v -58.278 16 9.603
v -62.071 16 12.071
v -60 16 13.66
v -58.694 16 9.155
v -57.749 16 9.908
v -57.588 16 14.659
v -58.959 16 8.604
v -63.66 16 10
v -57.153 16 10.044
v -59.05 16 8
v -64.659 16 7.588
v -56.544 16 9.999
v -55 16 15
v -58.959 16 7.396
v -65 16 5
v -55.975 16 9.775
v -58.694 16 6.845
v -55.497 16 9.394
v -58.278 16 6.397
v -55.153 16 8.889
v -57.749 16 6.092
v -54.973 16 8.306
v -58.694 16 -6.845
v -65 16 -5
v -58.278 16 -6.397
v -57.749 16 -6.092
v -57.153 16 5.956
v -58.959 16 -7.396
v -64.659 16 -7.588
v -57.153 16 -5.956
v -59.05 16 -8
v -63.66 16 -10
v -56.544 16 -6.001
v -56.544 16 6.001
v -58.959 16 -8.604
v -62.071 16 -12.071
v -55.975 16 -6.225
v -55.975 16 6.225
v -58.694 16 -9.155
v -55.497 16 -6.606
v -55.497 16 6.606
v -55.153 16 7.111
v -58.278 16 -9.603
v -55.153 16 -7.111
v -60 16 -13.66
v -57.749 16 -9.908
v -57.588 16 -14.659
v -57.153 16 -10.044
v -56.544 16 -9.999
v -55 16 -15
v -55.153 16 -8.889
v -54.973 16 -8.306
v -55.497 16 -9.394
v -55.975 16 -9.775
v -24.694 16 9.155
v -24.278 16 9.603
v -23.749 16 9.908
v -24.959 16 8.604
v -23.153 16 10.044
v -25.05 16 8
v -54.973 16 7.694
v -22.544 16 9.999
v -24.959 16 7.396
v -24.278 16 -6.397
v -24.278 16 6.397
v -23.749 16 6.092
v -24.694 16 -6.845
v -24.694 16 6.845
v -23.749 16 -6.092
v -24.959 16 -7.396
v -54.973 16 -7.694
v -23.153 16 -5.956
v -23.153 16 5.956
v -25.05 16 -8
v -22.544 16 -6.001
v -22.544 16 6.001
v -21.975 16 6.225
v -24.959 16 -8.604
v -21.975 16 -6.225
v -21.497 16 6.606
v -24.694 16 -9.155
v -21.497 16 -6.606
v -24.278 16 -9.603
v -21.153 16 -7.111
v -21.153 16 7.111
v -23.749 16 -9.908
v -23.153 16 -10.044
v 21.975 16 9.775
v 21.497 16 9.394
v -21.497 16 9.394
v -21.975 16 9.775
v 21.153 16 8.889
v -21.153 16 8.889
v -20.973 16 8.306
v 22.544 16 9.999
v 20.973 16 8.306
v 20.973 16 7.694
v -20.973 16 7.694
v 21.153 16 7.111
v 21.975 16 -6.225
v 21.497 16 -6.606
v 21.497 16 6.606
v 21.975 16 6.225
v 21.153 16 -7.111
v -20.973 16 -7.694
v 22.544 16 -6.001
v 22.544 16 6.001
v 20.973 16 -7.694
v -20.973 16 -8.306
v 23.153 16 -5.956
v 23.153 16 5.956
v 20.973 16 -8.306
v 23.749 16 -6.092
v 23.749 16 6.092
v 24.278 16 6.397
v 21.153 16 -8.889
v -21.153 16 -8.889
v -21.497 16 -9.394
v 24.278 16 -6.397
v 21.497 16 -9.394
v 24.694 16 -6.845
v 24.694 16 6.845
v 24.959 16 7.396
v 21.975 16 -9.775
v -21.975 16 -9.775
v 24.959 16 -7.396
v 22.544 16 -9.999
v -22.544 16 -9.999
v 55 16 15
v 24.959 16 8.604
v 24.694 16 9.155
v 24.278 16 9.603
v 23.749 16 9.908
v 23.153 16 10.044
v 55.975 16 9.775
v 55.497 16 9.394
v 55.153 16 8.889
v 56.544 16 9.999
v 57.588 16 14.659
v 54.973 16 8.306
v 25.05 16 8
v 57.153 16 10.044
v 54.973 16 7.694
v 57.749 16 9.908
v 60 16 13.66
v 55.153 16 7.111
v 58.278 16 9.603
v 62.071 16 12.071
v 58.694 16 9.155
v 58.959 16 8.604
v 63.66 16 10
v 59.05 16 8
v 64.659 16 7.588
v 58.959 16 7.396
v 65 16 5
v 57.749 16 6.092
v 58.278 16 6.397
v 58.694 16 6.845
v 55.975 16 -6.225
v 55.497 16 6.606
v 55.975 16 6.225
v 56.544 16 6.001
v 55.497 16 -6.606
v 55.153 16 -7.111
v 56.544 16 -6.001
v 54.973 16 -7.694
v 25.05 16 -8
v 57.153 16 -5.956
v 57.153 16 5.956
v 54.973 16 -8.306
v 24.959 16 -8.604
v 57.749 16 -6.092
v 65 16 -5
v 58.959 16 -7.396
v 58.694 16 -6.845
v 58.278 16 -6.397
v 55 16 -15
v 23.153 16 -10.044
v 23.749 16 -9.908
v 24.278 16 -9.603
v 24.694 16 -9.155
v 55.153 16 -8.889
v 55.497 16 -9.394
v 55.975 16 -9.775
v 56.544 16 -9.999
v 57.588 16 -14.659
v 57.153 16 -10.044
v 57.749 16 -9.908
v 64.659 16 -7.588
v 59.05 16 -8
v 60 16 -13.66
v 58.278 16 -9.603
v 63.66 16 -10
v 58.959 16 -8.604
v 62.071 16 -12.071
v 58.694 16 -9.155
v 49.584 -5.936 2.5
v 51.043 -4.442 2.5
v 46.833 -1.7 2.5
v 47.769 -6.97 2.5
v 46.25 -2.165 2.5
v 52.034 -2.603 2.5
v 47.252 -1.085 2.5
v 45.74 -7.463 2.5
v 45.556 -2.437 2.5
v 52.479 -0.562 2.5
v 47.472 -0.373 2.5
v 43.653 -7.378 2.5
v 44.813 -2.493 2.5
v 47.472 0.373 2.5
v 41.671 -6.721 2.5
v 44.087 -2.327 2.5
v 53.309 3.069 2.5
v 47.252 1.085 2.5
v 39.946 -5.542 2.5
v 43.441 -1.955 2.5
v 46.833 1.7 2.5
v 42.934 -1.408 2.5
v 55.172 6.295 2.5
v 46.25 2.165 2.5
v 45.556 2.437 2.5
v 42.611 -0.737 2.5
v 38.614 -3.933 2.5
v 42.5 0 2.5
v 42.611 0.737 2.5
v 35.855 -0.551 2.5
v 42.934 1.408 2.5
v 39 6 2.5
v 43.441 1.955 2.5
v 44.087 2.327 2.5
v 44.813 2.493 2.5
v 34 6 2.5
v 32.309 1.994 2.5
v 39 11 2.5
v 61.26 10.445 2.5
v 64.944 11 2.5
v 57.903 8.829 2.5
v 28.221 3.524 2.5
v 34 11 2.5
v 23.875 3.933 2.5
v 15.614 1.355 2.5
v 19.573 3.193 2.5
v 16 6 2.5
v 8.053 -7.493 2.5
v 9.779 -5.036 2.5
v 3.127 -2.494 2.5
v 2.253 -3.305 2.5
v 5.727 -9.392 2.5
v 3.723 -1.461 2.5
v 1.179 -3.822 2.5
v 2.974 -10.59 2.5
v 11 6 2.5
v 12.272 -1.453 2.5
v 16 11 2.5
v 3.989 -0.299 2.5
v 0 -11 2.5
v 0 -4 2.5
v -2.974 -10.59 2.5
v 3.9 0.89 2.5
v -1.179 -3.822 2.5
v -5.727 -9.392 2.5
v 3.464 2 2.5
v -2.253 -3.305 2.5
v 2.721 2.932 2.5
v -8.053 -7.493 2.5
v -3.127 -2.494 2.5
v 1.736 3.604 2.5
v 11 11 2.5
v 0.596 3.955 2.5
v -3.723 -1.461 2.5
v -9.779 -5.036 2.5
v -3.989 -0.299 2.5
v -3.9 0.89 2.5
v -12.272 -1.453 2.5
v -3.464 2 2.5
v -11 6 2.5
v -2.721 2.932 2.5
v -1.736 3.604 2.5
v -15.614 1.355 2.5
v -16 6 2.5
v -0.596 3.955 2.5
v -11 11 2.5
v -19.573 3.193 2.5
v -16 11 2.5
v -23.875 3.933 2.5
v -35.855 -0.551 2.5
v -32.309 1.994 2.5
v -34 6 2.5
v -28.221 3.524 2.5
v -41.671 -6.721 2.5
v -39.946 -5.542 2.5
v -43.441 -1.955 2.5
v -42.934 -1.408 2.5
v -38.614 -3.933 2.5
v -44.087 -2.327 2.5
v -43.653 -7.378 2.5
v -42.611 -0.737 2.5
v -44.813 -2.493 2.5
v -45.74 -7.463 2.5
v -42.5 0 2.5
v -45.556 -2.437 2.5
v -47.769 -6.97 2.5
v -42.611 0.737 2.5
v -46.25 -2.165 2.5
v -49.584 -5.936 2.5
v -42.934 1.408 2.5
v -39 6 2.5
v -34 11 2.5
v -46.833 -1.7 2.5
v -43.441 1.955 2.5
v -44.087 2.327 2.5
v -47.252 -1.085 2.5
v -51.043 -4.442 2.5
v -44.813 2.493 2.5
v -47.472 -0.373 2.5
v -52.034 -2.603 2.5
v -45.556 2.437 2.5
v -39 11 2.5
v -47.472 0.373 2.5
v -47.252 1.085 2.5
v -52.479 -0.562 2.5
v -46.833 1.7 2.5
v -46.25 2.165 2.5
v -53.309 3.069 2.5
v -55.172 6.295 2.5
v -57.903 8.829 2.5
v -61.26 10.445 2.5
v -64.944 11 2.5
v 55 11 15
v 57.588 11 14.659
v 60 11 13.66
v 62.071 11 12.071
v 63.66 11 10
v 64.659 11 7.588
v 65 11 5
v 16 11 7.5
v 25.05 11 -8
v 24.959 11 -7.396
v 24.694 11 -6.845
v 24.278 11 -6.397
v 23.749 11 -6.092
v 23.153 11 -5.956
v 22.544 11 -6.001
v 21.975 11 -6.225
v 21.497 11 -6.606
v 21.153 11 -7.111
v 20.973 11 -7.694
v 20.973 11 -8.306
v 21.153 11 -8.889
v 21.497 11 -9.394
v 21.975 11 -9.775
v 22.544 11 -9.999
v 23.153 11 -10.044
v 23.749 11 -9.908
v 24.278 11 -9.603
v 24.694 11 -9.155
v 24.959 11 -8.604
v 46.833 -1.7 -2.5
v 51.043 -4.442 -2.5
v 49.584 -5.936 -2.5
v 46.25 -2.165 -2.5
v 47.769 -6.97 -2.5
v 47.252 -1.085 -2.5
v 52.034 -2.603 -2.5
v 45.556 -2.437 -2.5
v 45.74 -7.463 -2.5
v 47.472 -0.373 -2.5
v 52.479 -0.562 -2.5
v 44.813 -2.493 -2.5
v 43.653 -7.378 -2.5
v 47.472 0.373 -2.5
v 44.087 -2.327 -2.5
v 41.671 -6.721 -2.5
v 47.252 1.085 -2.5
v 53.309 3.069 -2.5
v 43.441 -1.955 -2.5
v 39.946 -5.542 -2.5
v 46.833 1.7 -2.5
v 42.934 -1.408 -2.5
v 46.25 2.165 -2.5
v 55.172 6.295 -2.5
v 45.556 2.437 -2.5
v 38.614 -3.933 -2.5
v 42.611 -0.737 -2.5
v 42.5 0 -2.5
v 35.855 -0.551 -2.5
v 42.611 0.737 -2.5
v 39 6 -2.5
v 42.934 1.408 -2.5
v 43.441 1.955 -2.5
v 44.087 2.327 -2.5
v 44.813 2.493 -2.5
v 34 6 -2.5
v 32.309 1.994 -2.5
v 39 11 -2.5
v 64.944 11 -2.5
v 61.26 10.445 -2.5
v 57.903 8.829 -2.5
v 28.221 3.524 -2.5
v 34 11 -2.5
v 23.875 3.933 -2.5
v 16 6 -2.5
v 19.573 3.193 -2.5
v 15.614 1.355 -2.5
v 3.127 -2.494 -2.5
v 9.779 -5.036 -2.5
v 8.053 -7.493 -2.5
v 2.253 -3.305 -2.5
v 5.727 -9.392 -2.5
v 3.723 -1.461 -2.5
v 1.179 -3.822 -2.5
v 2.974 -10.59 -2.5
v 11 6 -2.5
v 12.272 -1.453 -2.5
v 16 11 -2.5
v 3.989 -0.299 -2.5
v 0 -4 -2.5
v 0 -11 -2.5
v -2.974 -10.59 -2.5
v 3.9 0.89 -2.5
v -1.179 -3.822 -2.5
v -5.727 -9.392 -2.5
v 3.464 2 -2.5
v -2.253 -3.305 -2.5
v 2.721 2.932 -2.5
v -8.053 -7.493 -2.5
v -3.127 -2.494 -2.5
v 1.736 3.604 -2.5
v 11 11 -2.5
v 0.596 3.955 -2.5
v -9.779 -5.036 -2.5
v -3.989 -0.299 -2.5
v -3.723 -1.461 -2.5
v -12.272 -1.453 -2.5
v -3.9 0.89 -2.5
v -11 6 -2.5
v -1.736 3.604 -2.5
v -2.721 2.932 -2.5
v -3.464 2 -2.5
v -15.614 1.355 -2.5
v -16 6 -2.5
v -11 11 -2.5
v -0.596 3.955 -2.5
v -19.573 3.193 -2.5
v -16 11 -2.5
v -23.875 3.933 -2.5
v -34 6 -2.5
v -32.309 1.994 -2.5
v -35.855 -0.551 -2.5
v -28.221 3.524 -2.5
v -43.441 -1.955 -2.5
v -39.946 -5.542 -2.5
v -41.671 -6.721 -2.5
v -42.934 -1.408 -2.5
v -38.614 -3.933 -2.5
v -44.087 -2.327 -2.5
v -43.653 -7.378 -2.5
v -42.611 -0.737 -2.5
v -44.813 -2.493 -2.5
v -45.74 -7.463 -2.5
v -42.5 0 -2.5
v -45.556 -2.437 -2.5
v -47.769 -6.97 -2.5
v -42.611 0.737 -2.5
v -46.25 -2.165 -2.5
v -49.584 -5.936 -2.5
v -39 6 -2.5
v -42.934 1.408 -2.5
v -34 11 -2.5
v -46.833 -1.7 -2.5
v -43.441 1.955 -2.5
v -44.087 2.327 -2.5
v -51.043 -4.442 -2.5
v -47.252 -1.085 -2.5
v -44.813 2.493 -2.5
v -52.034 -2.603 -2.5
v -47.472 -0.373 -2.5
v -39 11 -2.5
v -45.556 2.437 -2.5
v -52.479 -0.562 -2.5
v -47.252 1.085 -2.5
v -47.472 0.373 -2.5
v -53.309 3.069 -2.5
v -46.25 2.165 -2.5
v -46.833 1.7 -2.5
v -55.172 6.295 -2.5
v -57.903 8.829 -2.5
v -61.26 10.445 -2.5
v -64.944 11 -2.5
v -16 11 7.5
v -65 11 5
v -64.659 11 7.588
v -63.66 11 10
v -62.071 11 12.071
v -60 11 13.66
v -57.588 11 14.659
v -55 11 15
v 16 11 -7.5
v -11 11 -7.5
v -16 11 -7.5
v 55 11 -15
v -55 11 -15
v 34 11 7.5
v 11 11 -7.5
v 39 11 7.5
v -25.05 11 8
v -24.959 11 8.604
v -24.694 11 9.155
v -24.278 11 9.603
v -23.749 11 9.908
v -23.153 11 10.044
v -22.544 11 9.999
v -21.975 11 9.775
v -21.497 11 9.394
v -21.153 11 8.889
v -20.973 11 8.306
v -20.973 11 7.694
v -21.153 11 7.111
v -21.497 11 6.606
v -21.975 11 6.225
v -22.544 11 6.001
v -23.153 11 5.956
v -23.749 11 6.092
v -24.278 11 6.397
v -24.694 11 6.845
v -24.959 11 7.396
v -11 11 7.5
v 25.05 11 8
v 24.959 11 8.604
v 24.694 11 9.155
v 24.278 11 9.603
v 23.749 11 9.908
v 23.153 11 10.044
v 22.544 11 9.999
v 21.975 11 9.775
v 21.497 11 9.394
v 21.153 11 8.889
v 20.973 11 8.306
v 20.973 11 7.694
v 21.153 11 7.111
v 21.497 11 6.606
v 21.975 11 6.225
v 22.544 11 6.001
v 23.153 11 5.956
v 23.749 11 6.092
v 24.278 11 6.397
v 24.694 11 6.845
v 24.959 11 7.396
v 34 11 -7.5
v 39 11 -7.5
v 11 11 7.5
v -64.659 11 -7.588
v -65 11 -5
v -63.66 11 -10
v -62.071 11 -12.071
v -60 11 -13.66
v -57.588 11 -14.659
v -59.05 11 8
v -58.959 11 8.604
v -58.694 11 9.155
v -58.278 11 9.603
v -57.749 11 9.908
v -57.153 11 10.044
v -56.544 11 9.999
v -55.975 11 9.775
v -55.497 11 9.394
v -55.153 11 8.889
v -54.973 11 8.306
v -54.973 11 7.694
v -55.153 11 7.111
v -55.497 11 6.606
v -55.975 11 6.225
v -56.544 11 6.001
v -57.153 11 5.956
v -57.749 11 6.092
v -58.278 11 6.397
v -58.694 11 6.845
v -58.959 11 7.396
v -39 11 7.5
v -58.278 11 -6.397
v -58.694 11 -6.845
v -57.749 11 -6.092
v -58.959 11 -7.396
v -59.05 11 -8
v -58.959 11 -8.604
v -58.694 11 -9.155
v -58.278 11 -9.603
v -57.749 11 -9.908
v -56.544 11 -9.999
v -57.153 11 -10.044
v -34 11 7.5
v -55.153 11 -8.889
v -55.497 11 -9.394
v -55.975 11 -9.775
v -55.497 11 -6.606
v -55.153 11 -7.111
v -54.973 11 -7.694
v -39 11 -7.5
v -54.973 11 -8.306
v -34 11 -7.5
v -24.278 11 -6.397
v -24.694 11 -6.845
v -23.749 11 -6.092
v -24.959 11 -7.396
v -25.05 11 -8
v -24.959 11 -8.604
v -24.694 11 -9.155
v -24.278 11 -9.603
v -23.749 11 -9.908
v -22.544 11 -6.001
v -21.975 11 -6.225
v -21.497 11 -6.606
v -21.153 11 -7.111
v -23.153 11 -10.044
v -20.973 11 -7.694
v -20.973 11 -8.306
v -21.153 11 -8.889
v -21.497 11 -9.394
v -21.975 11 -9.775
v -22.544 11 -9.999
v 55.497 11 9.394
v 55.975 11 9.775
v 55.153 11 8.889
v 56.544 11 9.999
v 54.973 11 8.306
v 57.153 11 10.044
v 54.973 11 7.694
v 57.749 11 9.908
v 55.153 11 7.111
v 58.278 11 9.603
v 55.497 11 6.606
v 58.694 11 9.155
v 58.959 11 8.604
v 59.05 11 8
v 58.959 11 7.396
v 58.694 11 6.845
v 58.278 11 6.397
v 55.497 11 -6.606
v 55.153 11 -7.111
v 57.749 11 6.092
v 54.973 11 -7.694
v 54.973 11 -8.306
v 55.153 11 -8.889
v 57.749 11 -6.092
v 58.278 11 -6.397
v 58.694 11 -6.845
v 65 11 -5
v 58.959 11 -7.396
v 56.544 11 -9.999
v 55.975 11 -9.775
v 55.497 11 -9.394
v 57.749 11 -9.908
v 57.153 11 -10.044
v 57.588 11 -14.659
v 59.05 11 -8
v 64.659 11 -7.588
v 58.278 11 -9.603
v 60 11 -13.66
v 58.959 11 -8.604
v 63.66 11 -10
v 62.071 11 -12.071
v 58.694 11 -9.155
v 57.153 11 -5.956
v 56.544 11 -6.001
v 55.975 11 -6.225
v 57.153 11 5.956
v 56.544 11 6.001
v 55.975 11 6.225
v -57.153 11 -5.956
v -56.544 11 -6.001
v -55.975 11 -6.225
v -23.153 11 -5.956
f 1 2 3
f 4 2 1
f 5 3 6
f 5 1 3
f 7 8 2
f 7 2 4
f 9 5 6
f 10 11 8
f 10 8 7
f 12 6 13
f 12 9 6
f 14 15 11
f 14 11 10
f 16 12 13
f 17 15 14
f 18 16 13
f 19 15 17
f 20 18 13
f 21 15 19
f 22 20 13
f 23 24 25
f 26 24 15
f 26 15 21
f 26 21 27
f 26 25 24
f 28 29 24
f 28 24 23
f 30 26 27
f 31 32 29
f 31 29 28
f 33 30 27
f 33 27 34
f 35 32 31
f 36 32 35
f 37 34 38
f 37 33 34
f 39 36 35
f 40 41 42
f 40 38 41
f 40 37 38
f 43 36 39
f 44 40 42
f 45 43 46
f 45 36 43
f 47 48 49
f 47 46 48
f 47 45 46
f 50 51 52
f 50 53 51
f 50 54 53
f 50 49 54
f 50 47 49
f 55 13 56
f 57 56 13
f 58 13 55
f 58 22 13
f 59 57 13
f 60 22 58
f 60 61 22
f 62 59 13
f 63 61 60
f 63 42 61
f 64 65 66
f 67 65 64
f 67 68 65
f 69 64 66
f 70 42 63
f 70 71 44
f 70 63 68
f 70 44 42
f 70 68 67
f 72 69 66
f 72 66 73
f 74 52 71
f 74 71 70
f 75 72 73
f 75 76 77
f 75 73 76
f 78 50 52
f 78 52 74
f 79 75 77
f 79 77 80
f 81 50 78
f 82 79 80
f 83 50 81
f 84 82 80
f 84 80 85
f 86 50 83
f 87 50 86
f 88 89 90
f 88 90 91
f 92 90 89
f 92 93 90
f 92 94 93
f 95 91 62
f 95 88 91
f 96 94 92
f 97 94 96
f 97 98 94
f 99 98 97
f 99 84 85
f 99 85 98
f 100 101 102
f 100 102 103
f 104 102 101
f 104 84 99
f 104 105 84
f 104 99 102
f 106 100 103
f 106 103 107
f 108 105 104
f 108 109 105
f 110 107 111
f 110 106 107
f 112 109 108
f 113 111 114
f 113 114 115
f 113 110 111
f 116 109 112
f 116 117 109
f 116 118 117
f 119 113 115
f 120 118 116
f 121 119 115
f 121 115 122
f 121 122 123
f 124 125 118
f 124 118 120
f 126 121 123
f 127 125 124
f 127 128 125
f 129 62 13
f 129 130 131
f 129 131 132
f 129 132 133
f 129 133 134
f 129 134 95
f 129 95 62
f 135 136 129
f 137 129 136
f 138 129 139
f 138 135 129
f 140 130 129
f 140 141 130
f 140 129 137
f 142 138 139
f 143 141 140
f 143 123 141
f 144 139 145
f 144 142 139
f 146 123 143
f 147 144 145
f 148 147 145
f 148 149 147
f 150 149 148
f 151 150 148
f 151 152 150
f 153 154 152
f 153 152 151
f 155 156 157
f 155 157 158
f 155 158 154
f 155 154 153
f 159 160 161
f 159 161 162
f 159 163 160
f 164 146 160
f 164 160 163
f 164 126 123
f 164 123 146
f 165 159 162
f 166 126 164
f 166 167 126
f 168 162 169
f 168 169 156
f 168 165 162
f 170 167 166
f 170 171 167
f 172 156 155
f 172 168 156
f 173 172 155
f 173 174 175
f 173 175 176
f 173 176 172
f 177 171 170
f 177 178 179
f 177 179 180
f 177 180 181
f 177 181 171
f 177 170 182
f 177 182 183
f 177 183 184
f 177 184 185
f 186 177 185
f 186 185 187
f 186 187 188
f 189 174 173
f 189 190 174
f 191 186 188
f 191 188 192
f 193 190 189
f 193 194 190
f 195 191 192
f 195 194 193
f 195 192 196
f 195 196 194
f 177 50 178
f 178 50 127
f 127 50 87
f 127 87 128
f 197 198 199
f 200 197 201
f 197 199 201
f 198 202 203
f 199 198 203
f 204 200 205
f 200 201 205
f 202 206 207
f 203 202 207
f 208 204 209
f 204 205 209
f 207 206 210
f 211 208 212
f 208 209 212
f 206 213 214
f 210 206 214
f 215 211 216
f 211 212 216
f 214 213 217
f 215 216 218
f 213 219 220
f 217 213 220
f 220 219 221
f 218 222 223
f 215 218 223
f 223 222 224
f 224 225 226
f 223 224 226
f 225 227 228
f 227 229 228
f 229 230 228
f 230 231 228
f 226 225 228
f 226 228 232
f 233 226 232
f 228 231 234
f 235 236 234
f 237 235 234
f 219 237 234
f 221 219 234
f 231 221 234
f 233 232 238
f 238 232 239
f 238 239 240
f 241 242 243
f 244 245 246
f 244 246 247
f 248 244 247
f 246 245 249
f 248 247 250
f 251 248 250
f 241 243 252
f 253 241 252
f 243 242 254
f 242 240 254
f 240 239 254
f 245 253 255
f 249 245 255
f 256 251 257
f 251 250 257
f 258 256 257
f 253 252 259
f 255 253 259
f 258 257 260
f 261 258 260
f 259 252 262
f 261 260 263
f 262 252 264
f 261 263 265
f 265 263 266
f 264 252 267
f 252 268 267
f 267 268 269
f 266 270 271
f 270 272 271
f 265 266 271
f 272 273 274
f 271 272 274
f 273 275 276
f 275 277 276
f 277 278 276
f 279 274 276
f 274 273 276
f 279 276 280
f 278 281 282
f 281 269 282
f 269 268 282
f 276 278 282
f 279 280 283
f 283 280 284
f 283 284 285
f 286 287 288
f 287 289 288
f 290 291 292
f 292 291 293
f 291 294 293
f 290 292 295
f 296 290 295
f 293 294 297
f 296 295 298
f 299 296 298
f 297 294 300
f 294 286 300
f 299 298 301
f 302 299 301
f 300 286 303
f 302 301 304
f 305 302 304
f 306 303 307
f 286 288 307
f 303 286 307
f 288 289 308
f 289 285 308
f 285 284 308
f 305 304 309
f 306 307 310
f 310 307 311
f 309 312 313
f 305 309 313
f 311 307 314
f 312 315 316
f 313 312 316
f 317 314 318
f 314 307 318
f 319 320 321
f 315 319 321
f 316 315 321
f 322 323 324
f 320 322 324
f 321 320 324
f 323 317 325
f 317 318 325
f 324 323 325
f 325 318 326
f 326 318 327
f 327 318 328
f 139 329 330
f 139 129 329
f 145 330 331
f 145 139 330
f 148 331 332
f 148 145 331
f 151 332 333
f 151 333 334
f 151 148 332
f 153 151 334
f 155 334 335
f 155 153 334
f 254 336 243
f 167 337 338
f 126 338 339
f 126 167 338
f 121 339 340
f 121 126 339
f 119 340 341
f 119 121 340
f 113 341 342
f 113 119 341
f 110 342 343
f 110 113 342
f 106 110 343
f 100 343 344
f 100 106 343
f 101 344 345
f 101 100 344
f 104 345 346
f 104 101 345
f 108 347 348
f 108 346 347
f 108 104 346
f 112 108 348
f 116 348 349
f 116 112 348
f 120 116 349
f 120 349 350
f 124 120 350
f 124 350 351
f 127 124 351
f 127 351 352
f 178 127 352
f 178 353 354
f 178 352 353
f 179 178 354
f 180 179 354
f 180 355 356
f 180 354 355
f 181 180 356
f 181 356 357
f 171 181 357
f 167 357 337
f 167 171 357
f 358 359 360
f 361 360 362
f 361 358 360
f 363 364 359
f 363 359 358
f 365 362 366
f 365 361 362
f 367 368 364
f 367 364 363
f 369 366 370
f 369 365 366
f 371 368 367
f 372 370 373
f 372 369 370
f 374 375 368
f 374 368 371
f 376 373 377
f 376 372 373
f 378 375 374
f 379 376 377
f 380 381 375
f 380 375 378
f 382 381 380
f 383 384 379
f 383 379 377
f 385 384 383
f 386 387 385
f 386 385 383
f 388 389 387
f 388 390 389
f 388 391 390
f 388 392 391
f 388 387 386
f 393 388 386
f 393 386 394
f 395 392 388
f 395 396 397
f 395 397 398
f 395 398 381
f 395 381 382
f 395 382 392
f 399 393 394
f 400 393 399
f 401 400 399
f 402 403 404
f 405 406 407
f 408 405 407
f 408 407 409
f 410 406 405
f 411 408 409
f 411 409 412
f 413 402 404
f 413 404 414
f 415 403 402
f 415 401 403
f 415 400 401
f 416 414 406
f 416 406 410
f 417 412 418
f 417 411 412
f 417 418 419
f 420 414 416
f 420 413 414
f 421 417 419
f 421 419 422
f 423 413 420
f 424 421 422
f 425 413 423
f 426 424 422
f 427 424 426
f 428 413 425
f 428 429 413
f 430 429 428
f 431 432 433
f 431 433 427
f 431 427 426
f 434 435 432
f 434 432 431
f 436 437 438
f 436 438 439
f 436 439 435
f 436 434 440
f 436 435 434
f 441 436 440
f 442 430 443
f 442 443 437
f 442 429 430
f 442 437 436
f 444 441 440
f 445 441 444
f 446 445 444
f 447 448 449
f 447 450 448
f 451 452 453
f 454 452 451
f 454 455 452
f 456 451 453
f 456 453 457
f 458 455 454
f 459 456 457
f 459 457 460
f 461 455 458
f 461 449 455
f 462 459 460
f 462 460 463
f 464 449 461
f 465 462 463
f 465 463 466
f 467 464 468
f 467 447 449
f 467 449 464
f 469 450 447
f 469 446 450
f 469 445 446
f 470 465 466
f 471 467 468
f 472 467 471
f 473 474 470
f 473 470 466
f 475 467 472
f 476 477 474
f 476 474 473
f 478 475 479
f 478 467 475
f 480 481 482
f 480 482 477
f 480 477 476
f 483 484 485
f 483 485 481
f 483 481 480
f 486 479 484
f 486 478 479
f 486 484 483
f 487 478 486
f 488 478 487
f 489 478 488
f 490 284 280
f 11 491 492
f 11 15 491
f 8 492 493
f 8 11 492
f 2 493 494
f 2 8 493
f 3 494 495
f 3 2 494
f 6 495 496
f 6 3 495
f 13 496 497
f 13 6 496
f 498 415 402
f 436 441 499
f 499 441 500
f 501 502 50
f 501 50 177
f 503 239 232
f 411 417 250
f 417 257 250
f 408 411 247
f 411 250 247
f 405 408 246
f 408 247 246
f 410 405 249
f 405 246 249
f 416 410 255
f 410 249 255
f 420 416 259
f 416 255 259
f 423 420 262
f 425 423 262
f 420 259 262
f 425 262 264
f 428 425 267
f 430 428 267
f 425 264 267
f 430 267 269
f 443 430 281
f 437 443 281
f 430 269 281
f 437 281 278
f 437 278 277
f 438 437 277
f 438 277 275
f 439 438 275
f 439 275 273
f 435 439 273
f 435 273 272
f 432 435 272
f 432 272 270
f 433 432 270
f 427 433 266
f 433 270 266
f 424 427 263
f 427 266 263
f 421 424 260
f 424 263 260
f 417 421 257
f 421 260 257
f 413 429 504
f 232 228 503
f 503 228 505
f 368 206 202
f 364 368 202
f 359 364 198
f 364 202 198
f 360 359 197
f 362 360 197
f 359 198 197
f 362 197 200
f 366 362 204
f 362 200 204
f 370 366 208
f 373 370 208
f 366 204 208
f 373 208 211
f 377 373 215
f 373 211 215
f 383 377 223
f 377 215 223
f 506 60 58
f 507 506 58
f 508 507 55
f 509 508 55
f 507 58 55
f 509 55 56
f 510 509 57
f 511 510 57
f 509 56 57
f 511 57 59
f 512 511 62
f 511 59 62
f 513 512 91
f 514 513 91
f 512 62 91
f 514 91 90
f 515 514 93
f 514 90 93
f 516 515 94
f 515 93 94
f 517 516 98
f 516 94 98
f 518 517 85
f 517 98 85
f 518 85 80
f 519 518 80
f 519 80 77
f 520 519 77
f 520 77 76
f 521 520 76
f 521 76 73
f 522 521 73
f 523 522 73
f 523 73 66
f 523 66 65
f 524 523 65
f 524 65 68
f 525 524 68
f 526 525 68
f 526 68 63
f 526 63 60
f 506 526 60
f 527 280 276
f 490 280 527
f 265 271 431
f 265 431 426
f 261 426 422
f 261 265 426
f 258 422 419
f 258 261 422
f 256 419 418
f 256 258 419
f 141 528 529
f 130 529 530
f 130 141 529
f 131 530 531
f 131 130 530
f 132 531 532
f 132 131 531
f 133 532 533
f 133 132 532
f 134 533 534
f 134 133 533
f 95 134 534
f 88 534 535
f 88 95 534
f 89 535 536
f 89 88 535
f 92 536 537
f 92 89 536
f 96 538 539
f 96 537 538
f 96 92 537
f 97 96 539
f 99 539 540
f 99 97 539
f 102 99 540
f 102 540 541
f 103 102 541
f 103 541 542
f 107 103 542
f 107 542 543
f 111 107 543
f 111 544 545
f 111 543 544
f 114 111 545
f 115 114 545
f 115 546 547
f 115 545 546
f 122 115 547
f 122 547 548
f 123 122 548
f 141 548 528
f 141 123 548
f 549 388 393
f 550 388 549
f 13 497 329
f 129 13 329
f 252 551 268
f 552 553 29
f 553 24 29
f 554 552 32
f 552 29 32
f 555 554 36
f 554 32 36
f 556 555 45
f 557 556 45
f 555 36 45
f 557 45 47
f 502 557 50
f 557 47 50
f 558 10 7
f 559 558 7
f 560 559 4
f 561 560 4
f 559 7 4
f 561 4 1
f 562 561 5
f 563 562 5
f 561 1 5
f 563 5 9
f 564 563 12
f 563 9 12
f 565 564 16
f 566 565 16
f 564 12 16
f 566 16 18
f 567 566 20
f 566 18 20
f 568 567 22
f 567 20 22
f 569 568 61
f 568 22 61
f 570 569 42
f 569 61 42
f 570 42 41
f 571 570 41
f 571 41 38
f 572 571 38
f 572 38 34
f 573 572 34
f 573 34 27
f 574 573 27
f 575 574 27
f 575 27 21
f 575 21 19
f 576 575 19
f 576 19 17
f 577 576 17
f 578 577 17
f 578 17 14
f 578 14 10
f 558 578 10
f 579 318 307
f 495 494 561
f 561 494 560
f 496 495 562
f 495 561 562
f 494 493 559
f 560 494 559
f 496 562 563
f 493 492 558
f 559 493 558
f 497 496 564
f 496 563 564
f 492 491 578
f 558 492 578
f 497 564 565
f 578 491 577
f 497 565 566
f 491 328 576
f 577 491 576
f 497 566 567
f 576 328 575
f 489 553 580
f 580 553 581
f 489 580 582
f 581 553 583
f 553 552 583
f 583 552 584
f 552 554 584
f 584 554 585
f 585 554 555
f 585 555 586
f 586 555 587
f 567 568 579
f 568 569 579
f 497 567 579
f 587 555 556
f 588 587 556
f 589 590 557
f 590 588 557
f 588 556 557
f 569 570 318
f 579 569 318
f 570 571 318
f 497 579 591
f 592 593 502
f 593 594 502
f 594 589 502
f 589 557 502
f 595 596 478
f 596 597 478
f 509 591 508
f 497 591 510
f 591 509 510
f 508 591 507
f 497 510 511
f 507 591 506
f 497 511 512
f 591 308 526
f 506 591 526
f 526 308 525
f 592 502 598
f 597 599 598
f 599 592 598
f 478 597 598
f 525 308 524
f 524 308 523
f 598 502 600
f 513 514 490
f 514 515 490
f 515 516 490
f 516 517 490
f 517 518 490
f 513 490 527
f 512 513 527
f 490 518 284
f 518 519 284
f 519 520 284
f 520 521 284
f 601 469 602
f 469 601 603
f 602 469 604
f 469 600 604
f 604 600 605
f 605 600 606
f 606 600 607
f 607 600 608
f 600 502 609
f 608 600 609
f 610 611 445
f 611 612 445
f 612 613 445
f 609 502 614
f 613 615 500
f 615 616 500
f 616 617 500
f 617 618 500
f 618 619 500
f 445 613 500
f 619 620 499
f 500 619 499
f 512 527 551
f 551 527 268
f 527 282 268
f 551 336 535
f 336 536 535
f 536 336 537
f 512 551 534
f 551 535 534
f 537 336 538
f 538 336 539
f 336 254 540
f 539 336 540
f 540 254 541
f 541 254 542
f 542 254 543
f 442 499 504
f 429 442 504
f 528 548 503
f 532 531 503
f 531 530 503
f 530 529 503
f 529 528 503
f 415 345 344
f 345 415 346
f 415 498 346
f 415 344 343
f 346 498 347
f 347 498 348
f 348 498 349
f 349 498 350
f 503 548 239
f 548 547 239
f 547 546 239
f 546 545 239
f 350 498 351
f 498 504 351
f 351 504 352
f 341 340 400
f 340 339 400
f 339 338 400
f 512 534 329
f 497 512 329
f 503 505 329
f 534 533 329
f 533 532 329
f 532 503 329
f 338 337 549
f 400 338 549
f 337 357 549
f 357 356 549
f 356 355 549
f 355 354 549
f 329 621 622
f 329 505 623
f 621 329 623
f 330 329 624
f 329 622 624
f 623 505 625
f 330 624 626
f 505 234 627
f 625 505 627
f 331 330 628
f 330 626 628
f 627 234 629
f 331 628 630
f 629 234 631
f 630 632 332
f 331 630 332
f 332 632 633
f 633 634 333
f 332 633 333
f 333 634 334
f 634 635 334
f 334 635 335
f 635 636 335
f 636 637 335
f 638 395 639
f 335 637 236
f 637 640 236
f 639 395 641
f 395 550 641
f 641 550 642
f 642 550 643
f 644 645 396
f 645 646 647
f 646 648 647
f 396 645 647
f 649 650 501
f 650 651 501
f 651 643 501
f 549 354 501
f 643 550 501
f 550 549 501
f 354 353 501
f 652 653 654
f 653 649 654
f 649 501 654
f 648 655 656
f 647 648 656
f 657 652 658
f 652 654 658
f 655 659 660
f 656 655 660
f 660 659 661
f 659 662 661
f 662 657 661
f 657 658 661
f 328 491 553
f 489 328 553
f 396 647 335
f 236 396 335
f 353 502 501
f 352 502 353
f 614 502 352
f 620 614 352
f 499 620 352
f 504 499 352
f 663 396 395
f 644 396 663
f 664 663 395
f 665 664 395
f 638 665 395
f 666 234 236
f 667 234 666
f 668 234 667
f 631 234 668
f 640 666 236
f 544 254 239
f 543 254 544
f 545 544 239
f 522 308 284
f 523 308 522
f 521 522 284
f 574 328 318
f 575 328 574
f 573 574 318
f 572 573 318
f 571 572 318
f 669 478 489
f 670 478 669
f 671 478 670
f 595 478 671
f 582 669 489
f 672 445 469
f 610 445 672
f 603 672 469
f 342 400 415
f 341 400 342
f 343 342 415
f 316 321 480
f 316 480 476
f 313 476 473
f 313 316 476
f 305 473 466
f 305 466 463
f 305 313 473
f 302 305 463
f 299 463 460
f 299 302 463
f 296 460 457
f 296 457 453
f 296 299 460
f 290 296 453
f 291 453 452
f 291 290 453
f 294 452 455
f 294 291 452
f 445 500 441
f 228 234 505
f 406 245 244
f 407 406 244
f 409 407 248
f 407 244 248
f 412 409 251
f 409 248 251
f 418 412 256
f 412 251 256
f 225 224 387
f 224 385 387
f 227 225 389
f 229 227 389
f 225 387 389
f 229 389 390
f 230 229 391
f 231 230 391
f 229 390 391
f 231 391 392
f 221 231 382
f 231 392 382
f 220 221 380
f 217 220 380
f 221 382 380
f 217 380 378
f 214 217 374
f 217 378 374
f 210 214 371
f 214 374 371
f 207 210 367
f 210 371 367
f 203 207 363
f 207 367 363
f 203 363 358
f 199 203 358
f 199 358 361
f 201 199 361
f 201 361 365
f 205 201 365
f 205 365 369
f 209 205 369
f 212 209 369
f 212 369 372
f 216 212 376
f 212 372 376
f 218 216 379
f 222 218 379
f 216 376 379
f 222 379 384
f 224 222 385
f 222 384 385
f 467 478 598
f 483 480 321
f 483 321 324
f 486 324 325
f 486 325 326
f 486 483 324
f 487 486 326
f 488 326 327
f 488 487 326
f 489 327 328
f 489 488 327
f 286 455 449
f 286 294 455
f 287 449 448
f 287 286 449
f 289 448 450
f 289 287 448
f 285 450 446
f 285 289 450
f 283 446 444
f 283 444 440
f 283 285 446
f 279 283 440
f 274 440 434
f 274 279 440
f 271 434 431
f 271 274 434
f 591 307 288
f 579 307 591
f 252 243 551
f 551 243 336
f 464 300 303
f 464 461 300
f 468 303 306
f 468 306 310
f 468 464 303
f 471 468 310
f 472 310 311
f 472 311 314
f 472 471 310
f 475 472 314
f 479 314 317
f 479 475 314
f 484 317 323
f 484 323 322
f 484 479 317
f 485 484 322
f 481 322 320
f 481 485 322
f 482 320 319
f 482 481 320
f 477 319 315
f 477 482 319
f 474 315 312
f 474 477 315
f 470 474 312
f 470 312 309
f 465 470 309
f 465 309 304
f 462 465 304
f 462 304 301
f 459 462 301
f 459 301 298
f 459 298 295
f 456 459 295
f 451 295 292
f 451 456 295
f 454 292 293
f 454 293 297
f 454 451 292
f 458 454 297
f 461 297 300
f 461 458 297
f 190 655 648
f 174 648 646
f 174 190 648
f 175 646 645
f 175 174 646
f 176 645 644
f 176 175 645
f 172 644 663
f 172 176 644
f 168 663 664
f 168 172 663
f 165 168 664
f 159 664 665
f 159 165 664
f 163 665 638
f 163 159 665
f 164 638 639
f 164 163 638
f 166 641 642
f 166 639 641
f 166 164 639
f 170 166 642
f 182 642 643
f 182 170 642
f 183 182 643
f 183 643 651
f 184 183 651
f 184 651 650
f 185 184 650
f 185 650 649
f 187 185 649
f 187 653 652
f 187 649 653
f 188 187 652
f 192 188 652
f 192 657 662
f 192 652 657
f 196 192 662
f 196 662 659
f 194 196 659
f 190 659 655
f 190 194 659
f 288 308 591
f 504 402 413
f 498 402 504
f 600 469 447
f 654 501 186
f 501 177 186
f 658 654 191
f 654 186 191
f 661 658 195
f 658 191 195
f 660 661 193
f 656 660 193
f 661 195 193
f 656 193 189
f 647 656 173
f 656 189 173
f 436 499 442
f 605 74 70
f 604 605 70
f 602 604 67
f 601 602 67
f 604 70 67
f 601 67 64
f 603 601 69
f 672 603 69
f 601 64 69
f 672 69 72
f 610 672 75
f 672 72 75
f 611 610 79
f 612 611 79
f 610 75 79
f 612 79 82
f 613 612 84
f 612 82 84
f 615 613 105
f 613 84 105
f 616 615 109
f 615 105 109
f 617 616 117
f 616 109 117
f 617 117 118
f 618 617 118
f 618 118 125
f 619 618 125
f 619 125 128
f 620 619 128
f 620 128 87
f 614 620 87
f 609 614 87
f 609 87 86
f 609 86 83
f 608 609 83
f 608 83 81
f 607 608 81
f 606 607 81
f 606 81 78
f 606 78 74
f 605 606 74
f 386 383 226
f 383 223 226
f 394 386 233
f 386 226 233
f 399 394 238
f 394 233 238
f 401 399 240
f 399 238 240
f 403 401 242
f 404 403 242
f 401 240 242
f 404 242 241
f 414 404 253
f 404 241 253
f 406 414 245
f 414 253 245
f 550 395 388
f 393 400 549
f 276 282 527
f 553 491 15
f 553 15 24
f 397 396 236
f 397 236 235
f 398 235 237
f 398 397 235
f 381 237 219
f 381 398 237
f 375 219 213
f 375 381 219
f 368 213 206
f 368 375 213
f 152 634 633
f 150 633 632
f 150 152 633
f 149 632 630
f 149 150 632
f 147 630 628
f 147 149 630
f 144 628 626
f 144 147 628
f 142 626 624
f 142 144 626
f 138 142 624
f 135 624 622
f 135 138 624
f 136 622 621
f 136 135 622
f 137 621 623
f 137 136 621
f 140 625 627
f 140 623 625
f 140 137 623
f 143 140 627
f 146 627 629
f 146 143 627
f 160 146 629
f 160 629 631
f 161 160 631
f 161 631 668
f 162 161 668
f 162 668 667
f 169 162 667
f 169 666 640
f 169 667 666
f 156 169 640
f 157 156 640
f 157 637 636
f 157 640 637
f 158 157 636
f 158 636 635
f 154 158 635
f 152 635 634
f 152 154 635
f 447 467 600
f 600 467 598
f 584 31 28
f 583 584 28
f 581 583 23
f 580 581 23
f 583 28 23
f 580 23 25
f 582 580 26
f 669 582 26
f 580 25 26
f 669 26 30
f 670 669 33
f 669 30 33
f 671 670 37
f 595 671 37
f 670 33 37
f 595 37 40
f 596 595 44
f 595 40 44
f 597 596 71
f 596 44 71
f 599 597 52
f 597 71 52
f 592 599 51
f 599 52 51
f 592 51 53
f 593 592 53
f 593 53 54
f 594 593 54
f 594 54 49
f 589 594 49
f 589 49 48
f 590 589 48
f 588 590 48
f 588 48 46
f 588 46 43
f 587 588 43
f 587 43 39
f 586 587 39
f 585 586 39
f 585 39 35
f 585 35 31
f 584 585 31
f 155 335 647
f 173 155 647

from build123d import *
from build123d.topology import SkipClean

# Parameters (mm, degrees)
SKETCH1_R                                = 2.5
BOSS_EXTRUDE1_DEPTH                      = 2.5
SKETCH4_W                                = 130
SKETCH4_H                                = 30
BOSS_EXTRUDE2_DEPTH                      = 5
FILLET1_R                                = 10
FILLET2_R                                = 12.5
SKETCH5_R                                = 2.05
CUT_EXTRUDE1_DEPTH                       = 10
BOSS_EXTRUDE3_DEPTH                      = 2.5
LPATTERN1_COUNT                          = 2
LPATTERN1_PITCH                          = 23
MIRROR4_COPY_1_DEPTH                     = 2.5
MIRROR4_AT_THE_SECOND_PLANE_COPY_1_DEPTH = 2.5
MIRROR4_AT_THE_SECOND_PLANE_COPY_2_DEPTH = 2.5
MIRROR4_AT_THE_SECOND_PLANE_COPY_3_DEPTH = 2.5


with BuildPart() as part:
    # Sketch1 → Boss-Extrude1 (new, symmetric)
    with BuildSketch(Plane.XY):
        with BuildLine():
            ThreePointArc((-38.614160498, -3.933326056), (-23.874667518, 3.933250754), (-9.779272654, -5.036449778))
            ThreePointArc((-9.779272654, -5.036449778), (-5.727087063, -9.391510729), (0, -11))
            Line((0, -11), (0, -4))
            ThreePointArc((0, -4), (-4, 0), (0, 4))
            Line((0, 4), (0, 11))
            Line((0, 11), (-52.5, 11))
            Line((-52.5, 11), (-52.5, 0))
            ThreePointArc((-52.5, 0), (-47.044040574, -7.216086067), (-38.614160498, -3.933326056))
        make_face()
        with Locations((-45, 0)):
            Circle(SKETCH1_R, mode=Mode.SUBTRACT)
    boss_extrude1 = extrude(amount=BOSS_EXTRUDE1_DEPTH, both=True)

    # Mirror1: Boss-Extrude1 across plane
    with SkipClean():  # the faces are left unmerged after this step: merging them gives an invalid solid
        add(boss_extrude1.mirror(Plane(origin=(0, 0, -2.5), x_dir=(0, 0, 1), z_dir=(-1, 0, 0))))

    # Sketch4 → Boss-Extrude2 (add)
    with SkipClean():  # the faces are left unmerged after this step: merging them gives an invalid solid
        with BuildSketch(Plane(origin=(0, 11, 0), x_dir=(1, 0, 0), z_dir=(0, 1, 0))):
            Rectangle(SKETCH4_W, SKETCH4_H)
        extrude(amount=BOSS_EXTRUDE2_DEPTH)

    # Fillet1
    fillet1_edges = [part.edges().sort_by_distance(p)[0] for p in [
        (-65, 13.5, -15),
        (-65, 13.5, 15),
        (65, 13.5, 15),
        (65, 13.5, -15),
    ]]
    fillet(fillet1_edges, radius=FILLET1_R)

    # Fillet2
    # the kernel refuses this fillet: 12.5 mm, written as the material it adds along each edge
    with BuildSketch(Plane(origin=(-52.5, 11, -2.5), x_dir=(-1, 0, 0), z_dir=(0, 0, 1))) as fillet2_piece_1:
        with BuildLine():
            CenterArc((12.443670675, 12.5), FILLET2_R, 184.301222305, 85.698777695)
            Line((-0.021123497, 11.5625), (-1.267602914, 11.46875))
            ThreePointArc((-1.267602914, 11.46875), (-1.25, 11), (-1.25, 0))
            Line((-1.25, 0), (0, -1.25))
            Line((0, -1.25), (12.443670675, -1.25))
            Line((12.443670675, -1.25), (12.443670675, 0))
        make_face()
    extrude(amount=5)
    with BuildSketch(Plane(origin=(52.5, 11, -2.5), x_dir=(1, 0, 0), z_dir=(0, 0, 1))) as fillet2_piece_2:
        with BuildLine():
            CenterArc((12.443670675, -12.5), FILLET2_R, 90, 85.698777695)
            Line((-0.021123497, -11.5625), (-1.267602914, -11.46875))
            ThreePointArc((-1.267602914, -11.46875), (-1.25, -11), (-1.25, 0))
            Line((-1.25, 0), (0, 1.25))
            Line((0, 1.25), (12.443670675, 1.25))
            Line((12.443670675, 1.25), (12.443670675, 0))
        make_face()
    extrude(amount=5)

    # Sketch5 → Cut-Extrude1 (cut)
    with BuildSketch(Plane(origin=(0, 16, 0), x_dir=(1, 0, 0), z_dir=(0, 1, 0))):
        with Locations(Location((-57, -8, 0), (0, 0, 180))):
            Circle(SKETCH5_R)
        with Locations(Location((-57, 8, 0), (0, 0, 180))):
            Circle(SKETCH5_R)
        with Locations(Location((-23, -8, 0), (0, 0, 180))):
            Circle(SKETCH5_R)
        with Locations(Location((-23, 8, 0), (0, 0, 180))):
            Circle(SKETCH5_R)
    cut_extrude1 = extrude(amount=-CUT_EXTRUDE1_DEPTH, mode=Mode.SUBTRACT)

    # Mirror2: Cut-Extrude1 across plane
    add(cut_extrude1.mirror(Plane(origin=(0, 0, 0), x_dir=(0, 0, 1), z_dir=(1, 0, 0))), mode=Mode.SUBTRACT)

    # Sketch7 → Boss-Extrude3 (add, symmetric)
    with BuildSketch(Plane(origin=(36.5, 0, 0), x_dir=(0, 0, -1), z_dir=(1, 0, 0))):
        Polygon((5, 11), (2.5, 11), (2.5, 6), (7.5, 11), align=None)
    boss_extrude3 = extrude(amount=BOSS_EXTRUDE3_DEPTH, both=True)

    # LPattern1: Boss-Extrude3 ×2
    with Locations(*[(-i * LPATTERN1_PITCH, 0, 0) for i in range(1, LPATTERN1_COUNT)]):
        add(boss_extrude3)

    # Mirror4: Boss-Extrude3 across plane
    add(boss_extrude3.mirror(Plane.XY))

    # Mirror4 copy 1 sketch → Mirror4 copy 1 (add, symmetric)
    with BuildSketch(Plane(origin=(13.5, 0, 0), x_dir=(0, 0, 1), z_dir=(1, 0, 0))):
        Polygon((5, -11), (2.5, -11), (2.5, -6), (7.5, -11), align=None)
    extrude(amount=MIRROR4_COPY_1_DEPTH, both=True)

    # Mirror4 at the second plane: Boss-Extrude3 across plane
    add(boss_extrude3.mirror(Plane(origin=(0, 0, 0), x_dir=(0, 0, 1), z_dir=(1, 0, 0))))

    # Mirror4 at the second plane copy 1 sketc → Mirror4 at the second plane copy 1 (add, symmetric)
    with BuildSketch(Plane(origin=(-13.5, 0, 0), x_dir=(0, 0, -1), z_dir=(-1, 0, 0))):
        Polygon((5, -11), (2.5, -11), (2.5, -6), (7.5, -11), align=None)
    extrude(amount=MIRROR4_AT_THE_SECOND_PLANE_COPY_1_DEPTH, both=True)

    # Mirror4 at the second plane copy 2 sketc → Mirror4 at the second plane copy 2 (add, symmetric)
    with BuildSketch(Plane.ZY.offset(36.5)):
        Polygon((5, 11), (2.5, 11), (2.5, 6), (7.5, 11), align=None)
    extrude(amount=MIRROR4_AT_THE_SECOND_PLANE_COPY_2_DEPTH, both=True)

    # Mirror4 at the second plane copy 3 sketc → Mirror4 at the second plane copy 3 (add, symmetric)
    with BuildSketch(Plane.ZY.offset(13.5)):
        Polygon((5, 11), (2.5, 11), (2.5, 6), (7.5, 11), align=None)
    extrude(amount=MIRROR4_AT_THE_SECOND_PLANE_COPY_3_DEPTH, both=True)


solid = part.part
